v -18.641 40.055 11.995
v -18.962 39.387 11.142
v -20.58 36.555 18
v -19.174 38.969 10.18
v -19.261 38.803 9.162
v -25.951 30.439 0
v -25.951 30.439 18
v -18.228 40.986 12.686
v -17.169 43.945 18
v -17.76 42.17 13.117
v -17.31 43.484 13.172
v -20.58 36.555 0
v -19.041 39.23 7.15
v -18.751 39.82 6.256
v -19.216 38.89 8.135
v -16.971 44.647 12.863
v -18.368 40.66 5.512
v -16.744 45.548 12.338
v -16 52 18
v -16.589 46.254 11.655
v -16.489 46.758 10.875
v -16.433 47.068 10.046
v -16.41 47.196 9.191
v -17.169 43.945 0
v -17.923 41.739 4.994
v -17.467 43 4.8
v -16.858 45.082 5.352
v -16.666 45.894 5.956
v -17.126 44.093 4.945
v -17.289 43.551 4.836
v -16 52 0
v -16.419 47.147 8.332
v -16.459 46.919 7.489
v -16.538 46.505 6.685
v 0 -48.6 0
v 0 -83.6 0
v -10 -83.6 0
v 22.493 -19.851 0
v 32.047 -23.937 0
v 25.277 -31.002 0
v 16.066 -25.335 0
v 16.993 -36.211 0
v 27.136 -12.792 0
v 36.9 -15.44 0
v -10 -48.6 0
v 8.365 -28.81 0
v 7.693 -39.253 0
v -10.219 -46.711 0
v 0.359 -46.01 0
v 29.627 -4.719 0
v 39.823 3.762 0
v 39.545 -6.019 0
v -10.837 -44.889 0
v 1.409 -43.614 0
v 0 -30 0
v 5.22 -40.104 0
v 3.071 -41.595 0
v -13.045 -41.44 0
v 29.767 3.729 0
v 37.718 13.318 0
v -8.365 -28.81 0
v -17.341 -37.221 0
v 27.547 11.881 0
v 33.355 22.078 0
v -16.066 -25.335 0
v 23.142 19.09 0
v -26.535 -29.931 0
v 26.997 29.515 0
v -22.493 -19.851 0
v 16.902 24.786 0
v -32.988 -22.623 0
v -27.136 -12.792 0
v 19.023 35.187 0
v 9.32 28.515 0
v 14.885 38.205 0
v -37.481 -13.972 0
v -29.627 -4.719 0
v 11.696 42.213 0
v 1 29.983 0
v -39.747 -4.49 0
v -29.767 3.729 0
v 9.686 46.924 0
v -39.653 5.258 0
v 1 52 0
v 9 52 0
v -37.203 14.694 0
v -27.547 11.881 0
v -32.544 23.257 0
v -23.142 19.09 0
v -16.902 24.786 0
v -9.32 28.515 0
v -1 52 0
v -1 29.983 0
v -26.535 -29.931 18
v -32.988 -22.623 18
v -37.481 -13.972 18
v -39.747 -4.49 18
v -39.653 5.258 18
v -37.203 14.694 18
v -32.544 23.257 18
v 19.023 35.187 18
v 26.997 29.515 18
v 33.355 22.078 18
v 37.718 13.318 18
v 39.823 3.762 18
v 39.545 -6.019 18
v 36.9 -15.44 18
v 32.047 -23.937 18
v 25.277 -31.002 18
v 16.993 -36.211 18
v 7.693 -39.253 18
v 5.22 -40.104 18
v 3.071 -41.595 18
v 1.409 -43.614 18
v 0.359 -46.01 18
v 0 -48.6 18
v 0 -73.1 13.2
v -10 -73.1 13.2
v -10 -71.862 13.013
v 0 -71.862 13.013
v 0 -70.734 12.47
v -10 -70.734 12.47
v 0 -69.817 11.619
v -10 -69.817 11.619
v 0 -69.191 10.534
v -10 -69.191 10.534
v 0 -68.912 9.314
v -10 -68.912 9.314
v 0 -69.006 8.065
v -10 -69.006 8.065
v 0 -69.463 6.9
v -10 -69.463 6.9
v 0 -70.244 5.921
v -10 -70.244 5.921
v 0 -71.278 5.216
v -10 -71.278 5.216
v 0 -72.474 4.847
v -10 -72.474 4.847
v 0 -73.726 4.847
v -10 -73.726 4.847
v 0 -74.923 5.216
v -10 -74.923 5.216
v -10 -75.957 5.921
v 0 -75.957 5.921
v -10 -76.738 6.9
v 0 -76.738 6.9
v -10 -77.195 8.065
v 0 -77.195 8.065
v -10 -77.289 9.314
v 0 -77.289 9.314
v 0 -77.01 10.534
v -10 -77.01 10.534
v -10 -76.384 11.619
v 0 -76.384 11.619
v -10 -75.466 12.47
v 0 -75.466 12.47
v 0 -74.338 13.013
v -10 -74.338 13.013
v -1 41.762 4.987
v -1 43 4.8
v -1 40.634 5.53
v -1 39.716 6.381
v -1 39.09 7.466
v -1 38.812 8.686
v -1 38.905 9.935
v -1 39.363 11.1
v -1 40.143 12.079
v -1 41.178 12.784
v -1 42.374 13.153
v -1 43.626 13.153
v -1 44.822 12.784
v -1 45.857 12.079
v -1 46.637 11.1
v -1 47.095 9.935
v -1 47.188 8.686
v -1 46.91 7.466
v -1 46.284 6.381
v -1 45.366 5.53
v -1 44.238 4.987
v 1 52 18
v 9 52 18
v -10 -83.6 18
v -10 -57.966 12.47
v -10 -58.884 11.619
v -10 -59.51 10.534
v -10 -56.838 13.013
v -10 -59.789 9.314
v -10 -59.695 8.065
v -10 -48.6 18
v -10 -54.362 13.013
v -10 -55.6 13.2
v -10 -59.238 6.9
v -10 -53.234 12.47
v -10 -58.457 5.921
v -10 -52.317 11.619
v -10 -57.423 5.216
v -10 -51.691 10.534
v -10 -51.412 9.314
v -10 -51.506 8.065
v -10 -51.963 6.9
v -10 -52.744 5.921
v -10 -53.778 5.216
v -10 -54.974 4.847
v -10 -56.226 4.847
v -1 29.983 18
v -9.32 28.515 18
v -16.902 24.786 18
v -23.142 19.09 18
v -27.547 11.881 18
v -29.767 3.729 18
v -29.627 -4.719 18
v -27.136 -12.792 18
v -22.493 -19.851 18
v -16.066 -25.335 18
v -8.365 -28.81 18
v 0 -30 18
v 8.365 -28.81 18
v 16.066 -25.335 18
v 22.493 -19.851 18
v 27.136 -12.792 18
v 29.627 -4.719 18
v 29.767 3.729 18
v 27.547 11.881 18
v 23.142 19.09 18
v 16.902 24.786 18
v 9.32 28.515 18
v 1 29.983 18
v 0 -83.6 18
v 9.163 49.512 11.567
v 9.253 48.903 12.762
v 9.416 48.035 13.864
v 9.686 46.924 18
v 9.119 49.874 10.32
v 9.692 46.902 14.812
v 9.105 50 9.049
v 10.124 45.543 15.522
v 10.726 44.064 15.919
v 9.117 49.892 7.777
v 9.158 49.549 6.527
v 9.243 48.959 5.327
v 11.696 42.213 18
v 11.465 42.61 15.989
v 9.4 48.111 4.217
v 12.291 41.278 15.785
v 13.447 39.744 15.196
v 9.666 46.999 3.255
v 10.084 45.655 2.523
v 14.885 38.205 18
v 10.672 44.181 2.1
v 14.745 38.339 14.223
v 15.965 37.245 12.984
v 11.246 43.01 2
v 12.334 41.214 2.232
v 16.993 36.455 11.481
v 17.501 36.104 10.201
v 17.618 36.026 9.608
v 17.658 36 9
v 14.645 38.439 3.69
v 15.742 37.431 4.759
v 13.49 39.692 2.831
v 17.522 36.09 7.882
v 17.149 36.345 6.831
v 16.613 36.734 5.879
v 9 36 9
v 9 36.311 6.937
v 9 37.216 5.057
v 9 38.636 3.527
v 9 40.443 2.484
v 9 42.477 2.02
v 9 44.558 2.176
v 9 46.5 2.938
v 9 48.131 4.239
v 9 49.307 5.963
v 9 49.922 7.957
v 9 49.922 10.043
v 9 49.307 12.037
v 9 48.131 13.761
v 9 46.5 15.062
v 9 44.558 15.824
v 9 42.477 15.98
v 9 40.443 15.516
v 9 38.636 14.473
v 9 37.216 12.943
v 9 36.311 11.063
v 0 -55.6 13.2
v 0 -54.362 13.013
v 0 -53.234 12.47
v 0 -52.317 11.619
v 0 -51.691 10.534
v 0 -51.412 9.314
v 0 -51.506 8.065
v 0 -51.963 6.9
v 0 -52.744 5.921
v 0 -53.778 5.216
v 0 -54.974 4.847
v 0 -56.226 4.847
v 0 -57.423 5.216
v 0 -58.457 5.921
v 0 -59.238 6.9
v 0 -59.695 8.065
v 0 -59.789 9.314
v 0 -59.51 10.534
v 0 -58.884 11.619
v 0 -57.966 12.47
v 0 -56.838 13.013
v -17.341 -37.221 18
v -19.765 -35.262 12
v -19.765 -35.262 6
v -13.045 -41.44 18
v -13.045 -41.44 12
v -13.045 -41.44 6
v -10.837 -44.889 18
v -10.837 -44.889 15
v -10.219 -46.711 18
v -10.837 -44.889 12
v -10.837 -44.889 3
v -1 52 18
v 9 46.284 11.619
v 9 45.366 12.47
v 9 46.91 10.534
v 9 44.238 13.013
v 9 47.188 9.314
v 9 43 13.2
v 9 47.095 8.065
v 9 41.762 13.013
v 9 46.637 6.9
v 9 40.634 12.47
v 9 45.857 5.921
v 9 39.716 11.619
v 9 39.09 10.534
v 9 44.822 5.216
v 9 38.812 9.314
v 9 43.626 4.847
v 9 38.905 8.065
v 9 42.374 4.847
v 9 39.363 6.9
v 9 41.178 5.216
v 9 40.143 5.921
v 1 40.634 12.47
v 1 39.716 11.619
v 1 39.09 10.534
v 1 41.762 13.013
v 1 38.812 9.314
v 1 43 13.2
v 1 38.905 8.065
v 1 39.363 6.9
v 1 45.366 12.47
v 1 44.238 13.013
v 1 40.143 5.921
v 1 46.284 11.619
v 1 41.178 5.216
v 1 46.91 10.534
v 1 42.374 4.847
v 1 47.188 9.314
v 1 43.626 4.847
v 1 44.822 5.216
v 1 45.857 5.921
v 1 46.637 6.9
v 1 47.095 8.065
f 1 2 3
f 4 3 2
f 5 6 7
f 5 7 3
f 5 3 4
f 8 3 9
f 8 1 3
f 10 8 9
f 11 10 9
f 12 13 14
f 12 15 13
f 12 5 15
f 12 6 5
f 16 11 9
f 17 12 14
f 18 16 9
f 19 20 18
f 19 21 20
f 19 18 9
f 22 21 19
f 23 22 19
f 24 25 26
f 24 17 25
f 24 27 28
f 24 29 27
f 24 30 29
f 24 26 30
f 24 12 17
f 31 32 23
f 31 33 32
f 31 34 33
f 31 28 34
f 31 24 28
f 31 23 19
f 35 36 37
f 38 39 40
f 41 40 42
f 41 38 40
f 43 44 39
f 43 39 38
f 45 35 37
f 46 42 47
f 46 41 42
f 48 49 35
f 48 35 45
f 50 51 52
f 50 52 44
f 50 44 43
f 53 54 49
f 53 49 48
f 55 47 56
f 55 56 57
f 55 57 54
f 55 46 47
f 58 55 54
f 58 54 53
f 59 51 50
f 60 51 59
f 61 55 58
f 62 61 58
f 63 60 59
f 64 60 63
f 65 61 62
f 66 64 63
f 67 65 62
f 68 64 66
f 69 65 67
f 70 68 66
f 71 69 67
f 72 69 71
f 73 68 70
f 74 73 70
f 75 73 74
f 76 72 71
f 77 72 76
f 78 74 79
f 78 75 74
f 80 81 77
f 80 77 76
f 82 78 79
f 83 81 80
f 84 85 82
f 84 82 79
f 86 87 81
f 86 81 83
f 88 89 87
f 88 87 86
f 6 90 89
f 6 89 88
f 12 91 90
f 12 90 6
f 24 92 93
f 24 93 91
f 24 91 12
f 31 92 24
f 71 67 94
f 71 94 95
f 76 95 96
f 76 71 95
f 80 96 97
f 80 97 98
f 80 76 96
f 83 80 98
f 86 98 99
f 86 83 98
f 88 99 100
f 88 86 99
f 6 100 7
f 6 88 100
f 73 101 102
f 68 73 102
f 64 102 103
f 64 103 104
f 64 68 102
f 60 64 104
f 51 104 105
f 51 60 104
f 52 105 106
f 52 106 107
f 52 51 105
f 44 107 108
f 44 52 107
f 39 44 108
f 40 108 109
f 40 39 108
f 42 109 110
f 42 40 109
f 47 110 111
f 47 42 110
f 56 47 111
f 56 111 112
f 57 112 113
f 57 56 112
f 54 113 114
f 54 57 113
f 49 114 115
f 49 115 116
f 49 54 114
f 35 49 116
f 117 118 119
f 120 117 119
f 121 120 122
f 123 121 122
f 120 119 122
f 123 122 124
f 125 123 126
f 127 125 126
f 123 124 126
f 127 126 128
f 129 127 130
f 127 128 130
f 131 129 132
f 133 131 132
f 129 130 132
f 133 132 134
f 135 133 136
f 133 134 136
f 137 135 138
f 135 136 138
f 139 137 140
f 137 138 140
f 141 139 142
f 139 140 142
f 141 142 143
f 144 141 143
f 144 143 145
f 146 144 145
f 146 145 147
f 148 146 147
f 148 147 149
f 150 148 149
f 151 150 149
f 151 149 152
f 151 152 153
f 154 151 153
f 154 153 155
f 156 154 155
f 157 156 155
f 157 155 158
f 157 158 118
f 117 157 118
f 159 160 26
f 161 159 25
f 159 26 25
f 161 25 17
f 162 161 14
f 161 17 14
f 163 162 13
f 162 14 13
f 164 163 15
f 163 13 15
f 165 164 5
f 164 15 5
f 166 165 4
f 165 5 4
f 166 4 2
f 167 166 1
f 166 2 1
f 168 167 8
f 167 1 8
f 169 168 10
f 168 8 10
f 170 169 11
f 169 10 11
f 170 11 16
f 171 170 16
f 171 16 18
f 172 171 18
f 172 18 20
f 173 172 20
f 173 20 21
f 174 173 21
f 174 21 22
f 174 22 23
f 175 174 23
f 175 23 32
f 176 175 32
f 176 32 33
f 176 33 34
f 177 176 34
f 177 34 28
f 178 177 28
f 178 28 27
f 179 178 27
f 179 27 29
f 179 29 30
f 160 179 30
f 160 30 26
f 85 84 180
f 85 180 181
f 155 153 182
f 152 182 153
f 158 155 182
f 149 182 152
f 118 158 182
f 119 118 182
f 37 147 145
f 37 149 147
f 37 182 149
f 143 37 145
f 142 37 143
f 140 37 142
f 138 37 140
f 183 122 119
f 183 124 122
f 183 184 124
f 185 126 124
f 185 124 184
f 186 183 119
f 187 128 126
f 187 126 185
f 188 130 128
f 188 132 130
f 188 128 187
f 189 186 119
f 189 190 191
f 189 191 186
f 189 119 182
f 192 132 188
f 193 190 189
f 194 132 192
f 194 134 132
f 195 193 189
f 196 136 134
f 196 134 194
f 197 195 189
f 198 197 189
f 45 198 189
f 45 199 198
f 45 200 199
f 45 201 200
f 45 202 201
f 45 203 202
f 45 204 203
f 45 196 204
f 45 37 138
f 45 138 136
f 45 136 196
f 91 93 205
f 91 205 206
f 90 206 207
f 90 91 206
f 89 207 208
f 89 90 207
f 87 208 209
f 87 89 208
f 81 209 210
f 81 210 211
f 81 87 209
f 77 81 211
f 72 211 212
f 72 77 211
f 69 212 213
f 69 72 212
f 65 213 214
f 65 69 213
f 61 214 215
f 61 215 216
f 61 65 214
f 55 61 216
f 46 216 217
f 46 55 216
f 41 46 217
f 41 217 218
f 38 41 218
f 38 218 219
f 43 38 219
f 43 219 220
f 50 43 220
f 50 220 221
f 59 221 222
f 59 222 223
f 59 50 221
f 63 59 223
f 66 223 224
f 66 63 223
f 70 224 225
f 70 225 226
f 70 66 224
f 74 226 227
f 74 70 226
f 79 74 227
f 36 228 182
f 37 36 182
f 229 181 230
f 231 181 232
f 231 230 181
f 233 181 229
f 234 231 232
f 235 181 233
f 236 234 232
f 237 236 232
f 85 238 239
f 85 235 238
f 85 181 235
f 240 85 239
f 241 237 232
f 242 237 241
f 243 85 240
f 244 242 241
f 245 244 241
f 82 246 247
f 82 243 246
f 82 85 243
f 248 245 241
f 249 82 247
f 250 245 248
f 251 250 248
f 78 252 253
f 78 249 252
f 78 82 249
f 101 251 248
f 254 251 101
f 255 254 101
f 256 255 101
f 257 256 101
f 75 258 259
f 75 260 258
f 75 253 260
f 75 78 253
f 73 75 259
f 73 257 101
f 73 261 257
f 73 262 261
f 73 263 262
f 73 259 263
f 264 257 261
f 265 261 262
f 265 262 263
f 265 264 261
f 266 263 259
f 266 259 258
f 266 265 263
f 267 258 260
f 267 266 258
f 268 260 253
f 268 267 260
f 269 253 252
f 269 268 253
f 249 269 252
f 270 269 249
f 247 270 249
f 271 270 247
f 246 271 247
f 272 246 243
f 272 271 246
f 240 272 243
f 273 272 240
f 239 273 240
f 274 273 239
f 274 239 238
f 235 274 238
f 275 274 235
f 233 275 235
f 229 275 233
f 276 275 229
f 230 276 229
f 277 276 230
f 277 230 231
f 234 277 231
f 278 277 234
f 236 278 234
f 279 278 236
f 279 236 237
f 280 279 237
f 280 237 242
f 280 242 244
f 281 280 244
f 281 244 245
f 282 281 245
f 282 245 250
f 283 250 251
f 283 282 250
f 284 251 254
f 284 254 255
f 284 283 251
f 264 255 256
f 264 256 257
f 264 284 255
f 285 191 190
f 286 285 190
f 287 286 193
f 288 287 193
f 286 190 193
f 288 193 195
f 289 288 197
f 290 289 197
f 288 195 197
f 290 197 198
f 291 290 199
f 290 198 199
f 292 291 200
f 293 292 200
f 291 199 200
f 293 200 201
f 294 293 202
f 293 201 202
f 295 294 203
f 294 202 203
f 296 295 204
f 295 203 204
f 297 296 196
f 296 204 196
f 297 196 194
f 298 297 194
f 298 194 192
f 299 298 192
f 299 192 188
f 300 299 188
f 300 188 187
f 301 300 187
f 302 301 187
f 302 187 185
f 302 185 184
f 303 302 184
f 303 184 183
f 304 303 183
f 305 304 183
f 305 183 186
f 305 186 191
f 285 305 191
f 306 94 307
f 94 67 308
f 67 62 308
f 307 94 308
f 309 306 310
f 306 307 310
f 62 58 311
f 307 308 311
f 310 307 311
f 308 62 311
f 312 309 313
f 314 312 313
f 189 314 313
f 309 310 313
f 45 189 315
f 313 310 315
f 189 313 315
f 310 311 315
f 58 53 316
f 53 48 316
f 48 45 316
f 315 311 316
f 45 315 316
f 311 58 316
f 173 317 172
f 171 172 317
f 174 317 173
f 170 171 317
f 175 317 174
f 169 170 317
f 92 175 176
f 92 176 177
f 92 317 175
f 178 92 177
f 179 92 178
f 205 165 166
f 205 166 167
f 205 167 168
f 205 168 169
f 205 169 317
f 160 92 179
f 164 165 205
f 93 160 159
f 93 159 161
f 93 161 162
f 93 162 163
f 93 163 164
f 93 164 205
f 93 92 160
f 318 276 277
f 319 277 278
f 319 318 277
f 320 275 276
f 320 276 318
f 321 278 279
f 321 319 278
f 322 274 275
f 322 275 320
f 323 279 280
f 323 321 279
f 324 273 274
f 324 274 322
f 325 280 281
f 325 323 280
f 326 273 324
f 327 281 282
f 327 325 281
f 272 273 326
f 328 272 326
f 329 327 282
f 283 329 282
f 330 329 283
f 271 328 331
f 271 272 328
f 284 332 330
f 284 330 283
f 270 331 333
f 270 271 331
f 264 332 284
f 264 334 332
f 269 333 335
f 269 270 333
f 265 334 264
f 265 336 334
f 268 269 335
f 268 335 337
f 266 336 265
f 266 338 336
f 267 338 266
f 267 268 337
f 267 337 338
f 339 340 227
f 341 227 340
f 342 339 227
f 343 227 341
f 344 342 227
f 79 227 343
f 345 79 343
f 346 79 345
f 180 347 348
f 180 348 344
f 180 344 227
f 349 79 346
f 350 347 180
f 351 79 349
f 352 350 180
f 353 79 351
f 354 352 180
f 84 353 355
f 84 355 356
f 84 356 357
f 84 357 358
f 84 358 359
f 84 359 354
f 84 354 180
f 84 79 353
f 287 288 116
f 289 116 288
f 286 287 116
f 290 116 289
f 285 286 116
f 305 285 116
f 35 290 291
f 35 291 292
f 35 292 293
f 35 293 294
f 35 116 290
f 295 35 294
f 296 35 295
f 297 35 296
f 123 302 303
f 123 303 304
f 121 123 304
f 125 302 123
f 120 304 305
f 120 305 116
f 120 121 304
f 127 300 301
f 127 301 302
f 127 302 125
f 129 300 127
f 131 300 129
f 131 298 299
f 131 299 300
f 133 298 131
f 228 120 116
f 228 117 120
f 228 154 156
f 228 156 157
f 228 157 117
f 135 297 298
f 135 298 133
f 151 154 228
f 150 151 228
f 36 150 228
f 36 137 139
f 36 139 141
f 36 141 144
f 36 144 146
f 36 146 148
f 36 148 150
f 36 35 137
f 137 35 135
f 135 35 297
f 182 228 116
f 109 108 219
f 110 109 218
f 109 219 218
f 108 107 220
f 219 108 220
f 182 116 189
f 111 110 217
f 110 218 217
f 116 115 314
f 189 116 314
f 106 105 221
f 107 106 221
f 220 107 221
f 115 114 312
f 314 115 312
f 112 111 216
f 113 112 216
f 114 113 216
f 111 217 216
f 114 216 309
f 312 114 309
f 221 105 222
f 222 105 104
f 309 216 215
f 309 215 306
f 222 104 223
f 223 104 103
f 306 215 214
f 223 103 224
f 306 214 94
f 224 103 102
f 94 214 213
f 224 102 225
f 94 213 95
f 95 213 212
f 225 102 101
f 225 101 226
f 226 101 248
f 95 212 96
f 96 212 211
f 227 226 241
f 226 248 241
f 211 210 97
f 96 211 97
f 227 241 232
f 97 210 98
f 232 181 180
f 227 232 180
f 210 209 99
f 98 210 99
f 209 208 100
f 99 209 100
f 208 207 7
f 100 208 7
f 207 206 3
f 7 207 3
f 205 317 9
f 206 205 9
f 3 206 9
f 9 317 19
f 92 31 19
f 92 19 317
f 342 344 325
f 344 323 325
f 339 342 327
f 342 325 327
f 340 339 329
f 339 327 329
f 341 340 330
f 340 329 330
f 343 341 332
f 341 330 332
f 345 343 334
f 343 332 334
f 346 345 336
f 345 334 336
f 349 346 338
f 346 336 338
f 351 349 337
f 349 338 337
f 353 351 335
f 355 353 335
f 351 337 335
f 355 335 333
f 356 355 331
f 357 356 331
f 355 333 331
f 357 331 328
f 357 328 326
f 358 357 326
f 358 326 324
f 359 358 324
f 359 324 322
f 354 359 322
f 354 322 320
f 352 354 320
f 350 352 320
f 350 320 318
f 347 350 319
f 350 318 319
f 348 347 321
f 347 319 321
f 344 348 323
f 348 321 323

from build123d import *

# Parameters (mm, degrees)
MAIN_BODY_DEPTH      = 18
SKETCH14_W           = 4.2
SKETCH14_H           = 39
M8_CLEARANCE_HOLE2_D = 8.4
M8_CLEARANCE_HOLE3_D = 8.4
SKETCH27_R           = 7
CUT_EXTRUDE2_DEPTH   = 99.559772913


with BuildPart() as part:
    # Sketch1 → main body (new body)
    with BuildSketch(Plane.XY):
        with BuildLine():
            Line((0, -48.600411521), (0, -83.600411521))
            Line((0, -83.600411521), (-10, -83.600411521))
            Line((-10, -83.600411521), (-10, -48.600411521))
            add(Edge.make_bspline(
                [(-26.535230031, -29.931280748), (-20.948212629, -34.88438627), (-10, -40.904022772), (-10, -48.600411521)],
                knots=[0, 0, 0, 0, 1, 1, 1, 1], degree=3))
            ThreePointArc((-26.535230031, -29.931280748), (-39.998128482, 0.386934068), (-25.951219512, 30.43902439))
            ThreePointArc((-25.951219512, 30.43902439), (-18.607817439, 40.126684972), (-16, 52))
            Line((-16, 52), (-1, 52))
            Line((-1, 52), (-1, 29.983328701))
            ThreePointArc((-1, 29.983328701), (0, -30), (1, 29.983328701))
            Line((1, 29.983328701), (1, 52))
            Line((1, 52), (9, 52))
            ThreePointArc((9, 52), (11.695932832, 42.212959957), (19.02319236, 35.186903138))
            ThreePointArc((19.02319236, 35.186903138), (39.54457484, -6.018853774), (7.693084301, -39.253234949))
            ThreePointArc((7.693084301, -39.253234949), (2.170592409, -42.547452411), (0, -48.600411521))
        make_face()
    extrude(amount=MAIN_BODY_DEPTH)

    # Sketch14 → M8 Clearance Hole1 (revolve, cut)
    with BuildSketch(Plane(origin=(1, 43, 9), x_dir=(0, 0, 1), z_dir=(0, 1, 0))):
        with Locations((2.1, 19.5)):
            Rectangle(SKETCH14_W, SKETCH14_H)
    revolve(axis=Axis((-5.35, 43, 9), (1, 0, 0)), mode=Mode.SUBTRACT)

    # M8 Clearance Hole2 (through all)
    with Locations(Plane(origin=(1, 0, 0), x_dir=(0, 0, 1), z_dir=(1, 0, 0))):
        with Locations((9, -43)):
            Hole(M8_CLEARANCE_HOLE2_D / 2)

    # M8 Clearance Hole3 (through all)
    with Locations(Plane(origin=(0, 0, 0), x_dir=(0, 0, -1), z_dir=(1, 0, 0))):
        with Locations((-9, -55.600411521), (-9, -73.100411521)):
            Hole(M8_CLEARANCE_HOLE3_D / 2)

    # Sketch27 → Cut-Extrude2 (cut, through all)
    with BuildSketch(Plane(origin=(9, 0, 0), x_dir=(0, 0, -1), z_dir=(1, 0, 0))):
        with Locations(Location((-9, 43, 0), (0, 0, 270))):
            Circle(SKETCH27_R)
    extrude(amount=CUT_EXTRUDE2_DEPTH, mode=Mode.SUBTRACT)


solid = part.part
